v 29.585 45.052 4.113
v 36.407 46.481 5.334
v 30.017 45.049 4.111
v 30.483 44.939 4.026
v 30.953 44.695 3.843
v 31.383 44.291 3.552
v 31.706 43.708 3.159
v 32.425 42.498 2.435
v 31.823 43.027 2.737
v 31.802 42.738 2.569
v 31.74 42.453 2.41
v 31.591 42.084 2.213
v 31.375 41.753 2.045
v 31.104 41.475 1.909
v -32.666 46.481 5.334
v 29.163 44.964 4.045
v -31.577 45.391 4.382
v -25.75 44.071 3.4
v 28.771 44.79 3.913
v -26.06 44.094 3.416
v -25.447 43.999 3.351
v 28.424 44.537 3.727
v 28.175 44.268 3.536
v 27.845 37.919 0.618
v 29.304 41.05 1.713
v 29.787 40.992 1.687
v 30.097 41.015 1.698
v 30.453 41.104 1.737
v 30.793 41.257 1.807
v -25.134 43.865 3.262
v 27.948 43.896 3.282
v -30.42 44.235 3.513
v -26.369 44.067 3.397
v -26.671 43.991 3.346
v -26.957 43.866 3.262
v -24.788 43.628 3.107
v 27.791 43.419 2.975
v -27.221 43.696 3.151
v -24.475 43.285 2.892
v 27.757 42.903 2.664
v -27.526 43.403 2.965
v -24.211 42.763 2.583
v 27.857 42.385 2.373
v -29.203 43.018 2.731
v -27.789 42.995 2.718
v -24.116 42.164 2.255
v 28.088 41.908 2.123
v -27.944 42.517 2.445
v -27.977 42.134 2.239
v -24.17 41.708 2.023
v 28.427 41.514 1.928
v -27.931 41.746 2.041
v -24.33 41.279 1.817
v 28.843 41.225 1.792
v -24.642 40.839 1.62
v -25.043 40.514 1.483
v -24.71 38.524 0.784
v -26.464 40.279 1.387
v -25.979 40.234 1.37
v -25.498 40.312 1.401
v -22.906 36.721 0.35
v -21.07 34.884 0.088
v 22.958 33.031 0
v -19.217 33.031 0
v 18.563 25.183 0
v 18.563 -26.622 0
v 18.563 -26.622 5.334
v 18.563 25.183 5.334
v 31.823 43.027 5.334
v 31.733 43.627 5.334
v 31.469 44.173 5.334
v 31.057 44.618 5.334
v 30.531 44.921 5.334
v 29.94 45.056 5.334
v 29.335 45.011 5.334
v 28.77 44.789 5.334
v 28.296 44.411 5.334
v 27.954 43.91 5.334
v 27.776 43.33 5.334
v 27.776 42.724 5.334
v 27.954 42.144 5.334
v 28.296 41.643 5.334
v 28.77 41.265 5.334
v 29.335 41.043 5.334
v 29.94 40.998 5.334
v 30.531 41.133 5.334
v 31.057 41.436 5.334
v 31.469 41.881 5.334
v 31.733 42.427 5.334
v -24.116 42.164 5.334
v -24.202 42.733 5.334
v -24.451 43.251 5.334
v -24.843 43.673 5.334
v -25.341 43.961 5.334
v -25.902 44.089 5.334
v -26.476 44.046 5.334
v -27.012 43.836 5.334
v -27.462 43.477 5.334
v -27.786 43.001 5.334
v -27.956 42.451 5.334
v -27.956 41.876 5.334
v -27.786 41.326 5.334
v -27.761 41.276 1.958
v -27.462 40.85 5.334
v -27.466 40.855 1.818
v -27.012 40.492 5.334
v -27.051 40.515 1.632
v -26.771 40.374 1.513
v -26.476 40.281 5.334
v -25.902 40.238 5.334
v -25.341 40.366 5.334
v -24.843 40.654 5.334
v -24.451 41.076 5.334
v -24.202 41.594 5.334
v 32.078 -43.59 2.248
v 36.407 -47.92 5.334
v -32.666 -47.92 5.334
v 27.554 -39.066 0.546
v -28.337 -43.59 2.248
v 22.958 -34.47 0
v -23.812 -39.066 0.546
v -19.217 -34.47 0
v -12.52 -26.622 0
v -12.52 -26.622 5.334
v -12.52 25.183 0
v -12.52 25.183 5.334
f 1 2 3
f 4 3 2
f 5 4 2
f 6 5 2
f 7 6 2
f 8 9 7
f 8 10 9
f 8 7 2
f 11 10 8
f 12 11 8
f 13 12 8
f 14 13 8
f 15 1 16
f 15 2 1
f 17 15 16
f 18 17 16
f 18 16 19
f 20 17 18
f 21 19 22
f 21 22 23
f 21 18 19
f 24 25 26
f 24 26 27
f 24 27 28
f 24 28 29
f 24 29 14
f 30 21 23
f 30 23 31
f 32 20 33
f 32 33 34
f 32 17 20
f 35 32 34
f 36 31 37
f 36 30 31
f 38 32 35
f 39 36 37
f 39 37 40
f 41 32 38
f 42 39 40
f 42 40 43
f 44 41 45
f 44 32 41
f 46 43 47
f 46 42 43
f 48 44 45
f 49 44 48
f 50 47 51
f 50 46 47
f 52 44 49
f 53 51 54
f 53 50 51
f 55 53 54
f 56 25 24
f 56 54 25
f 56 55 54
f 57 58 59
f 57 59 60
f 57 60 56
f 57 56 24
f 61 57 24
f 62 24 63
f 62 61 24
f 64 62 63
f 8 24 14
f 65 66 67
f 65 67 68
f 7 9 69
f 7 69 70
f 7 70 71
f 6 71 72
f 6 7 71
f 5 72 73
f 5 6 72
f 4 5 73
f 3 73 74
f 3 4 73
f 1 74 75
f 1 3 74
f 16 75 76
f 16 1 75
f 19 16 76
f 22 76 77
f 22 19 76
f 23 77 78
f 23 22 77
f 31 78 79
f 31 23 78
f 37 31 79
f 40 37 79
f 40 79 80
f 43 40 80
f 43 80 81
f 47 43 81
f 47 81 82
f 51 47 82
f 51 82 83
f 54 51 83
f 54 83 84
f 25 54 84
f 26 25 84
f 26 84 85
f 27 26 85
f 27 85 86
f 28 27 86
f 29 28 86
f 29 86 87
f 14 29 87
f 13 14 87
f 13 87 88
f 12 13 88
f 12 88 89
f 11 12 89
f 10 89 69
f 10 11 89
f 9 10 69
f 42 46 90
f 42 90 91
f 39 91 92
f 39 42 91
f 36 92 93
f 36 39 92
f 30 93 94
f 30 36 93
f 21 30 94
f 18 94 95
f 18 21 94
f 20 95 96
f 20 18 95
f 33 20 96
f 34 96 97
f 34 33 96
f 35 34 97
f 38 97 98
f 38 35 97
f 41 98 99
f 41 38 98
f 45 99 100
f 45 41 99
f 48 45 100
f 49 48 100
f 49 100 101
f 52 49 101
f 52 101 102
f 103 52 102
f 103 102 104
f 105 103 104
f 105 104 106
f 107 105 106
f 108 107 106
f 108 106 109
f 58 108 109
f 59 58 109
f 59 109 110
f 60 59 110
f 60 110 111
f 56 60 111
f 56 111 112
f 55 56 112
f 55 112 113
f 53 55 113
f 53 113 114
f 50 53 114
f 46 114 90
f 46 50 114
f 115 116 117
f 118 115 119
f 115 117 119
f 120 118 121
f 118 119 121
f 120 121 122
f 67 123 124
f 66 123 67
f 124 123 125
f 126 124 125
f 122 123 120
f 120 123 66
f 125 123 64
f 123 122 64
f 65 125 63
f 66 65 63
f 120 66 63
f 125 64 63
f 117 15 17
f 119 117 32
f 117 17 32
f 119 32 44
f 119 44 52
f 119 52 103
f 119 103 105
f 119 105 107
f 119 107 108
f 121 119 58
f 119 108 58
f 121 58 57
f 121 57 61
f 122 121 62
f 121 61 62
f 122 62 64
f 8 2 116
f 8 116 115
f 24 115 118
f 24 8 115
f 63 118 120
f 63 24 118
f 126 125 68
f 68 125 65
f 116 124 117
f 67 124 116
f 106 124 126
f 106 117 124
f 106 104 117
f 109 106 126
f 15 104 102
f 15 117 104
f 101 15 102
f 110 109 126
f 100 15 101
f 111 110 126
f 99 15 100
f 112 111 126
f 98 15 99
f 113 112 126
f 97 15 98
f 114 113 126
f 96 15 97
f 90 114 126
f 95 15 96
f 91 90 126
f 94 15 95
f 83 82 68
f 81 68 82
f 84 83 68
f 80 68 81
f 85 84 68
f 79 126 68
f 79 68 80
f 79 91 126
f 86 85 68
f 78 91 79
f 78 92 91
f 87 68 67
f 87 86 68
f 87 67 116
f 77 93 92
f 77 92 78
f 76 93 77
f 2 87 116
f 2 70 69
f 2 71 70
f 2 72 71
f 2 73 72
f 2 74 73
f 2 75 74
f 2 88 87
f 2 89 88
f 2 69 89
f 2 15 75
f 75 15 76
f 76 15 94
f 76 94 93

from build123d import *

# Parameters (mm, degrees)
F0_W        = 69.0733827651
F0_H        = 94.4002903998
F0_R        = 1.9306579711
F0_W_2      = 31.083021313
F0_H_2      = 51.8050361425
F0_R_2      = 2.0350948247
F1_DEPTH    = 5.334
F2_T1_DEPTH = 136.319889095
F2_T3_DEPTH = 161.6467967298


# Not quite as in the source:
# - a fillet or chamfer that OpenCascade refuses, or shapes differently, is made with other operations: its cross-section is extruded or revolved along the edge and cut away or added


with BuildPart() as f1:
    # F0 (on Top) → F1 (new body)
    with BuildSketch(Plane.XY):
        with Locations((1.8707383424, -0.7195156068)):
            Rectangle(F0_W, F0_H)
        with Locations((-26.0464213789, 42.1635434031)):
            Circle(F0_R, mode=Mode.SUBTRACT)
        with Locations((3.021961078, -0.7195146754)):
            Rectangle(F0_W_2, F0_H_2, mode=Mode.SUBTRACT)
        with Locations((29.7878980637, 43.0269613862)):
            Circle(F0_R_2, mode=Mode.SUBTRACT)
    extrude(amount=F1_DEPTH)

    # F2: fillet of radius 19.622727835 on 4 edges, made by hand

    # F2_s2 → F2_t1 (cut)
    with BuildSketch(Plane.YZ.offset(-66.2892062051)):
        with BuildLine():
            ThreePointArc((46.4806295931, 5.334), (40.2655397656, 1.3821787054), (33.0313283271, 0))
            Line((33.0313283271, 0), (46.4806295931, 0))
            Line((46.4806295931, 0), (46.4806295931, 5.334))
        make_face()
        with BuildLine():
            ThreePointArc((-47.9196608067, 5.334), (-41.7045709791, 1.3821787054), (-34.4703595407, 0))
            Line((-34.4703595407, 0), (-47.9196608067, 0))
            Line((-47.9196608067, 0), (-47.9196608067, 5.334))
        make_face()
    extrude(amount=F2_T1_DEPTH, mode=Mode.SUBTRACT)

    # F2_s4 → F2_t3 (cut)
    with BuildSketch(Plane.XZ.offset(-80.1038827581)):
        with BuildLine():
            ThreePointArc((36.4074297249, 5.334), (30.1923398974, 1.3821787054), (22.9581284589, 0))
            Line((22.9581284589, 0), (36.4074297249, 0))
            Line((36.4074297249, 0), (36.4074297249, 5.334))
        make_face()
        with BuildLine():
            ThreePointArc((-32.6659530401, 5.334), (-26.4508632126, 1.3821787054), (-19.2166517741, 0))
            Line((-19.2166517741, 0), (-32.6659530401, 0))
            Line((-32.6659530401, 0), (-32.6659530401, 5.334))
        make_face()
    extrude(amount=F2_T3_DEPTH, mode=Mode.SUBTRACT)


solid = f1.part
